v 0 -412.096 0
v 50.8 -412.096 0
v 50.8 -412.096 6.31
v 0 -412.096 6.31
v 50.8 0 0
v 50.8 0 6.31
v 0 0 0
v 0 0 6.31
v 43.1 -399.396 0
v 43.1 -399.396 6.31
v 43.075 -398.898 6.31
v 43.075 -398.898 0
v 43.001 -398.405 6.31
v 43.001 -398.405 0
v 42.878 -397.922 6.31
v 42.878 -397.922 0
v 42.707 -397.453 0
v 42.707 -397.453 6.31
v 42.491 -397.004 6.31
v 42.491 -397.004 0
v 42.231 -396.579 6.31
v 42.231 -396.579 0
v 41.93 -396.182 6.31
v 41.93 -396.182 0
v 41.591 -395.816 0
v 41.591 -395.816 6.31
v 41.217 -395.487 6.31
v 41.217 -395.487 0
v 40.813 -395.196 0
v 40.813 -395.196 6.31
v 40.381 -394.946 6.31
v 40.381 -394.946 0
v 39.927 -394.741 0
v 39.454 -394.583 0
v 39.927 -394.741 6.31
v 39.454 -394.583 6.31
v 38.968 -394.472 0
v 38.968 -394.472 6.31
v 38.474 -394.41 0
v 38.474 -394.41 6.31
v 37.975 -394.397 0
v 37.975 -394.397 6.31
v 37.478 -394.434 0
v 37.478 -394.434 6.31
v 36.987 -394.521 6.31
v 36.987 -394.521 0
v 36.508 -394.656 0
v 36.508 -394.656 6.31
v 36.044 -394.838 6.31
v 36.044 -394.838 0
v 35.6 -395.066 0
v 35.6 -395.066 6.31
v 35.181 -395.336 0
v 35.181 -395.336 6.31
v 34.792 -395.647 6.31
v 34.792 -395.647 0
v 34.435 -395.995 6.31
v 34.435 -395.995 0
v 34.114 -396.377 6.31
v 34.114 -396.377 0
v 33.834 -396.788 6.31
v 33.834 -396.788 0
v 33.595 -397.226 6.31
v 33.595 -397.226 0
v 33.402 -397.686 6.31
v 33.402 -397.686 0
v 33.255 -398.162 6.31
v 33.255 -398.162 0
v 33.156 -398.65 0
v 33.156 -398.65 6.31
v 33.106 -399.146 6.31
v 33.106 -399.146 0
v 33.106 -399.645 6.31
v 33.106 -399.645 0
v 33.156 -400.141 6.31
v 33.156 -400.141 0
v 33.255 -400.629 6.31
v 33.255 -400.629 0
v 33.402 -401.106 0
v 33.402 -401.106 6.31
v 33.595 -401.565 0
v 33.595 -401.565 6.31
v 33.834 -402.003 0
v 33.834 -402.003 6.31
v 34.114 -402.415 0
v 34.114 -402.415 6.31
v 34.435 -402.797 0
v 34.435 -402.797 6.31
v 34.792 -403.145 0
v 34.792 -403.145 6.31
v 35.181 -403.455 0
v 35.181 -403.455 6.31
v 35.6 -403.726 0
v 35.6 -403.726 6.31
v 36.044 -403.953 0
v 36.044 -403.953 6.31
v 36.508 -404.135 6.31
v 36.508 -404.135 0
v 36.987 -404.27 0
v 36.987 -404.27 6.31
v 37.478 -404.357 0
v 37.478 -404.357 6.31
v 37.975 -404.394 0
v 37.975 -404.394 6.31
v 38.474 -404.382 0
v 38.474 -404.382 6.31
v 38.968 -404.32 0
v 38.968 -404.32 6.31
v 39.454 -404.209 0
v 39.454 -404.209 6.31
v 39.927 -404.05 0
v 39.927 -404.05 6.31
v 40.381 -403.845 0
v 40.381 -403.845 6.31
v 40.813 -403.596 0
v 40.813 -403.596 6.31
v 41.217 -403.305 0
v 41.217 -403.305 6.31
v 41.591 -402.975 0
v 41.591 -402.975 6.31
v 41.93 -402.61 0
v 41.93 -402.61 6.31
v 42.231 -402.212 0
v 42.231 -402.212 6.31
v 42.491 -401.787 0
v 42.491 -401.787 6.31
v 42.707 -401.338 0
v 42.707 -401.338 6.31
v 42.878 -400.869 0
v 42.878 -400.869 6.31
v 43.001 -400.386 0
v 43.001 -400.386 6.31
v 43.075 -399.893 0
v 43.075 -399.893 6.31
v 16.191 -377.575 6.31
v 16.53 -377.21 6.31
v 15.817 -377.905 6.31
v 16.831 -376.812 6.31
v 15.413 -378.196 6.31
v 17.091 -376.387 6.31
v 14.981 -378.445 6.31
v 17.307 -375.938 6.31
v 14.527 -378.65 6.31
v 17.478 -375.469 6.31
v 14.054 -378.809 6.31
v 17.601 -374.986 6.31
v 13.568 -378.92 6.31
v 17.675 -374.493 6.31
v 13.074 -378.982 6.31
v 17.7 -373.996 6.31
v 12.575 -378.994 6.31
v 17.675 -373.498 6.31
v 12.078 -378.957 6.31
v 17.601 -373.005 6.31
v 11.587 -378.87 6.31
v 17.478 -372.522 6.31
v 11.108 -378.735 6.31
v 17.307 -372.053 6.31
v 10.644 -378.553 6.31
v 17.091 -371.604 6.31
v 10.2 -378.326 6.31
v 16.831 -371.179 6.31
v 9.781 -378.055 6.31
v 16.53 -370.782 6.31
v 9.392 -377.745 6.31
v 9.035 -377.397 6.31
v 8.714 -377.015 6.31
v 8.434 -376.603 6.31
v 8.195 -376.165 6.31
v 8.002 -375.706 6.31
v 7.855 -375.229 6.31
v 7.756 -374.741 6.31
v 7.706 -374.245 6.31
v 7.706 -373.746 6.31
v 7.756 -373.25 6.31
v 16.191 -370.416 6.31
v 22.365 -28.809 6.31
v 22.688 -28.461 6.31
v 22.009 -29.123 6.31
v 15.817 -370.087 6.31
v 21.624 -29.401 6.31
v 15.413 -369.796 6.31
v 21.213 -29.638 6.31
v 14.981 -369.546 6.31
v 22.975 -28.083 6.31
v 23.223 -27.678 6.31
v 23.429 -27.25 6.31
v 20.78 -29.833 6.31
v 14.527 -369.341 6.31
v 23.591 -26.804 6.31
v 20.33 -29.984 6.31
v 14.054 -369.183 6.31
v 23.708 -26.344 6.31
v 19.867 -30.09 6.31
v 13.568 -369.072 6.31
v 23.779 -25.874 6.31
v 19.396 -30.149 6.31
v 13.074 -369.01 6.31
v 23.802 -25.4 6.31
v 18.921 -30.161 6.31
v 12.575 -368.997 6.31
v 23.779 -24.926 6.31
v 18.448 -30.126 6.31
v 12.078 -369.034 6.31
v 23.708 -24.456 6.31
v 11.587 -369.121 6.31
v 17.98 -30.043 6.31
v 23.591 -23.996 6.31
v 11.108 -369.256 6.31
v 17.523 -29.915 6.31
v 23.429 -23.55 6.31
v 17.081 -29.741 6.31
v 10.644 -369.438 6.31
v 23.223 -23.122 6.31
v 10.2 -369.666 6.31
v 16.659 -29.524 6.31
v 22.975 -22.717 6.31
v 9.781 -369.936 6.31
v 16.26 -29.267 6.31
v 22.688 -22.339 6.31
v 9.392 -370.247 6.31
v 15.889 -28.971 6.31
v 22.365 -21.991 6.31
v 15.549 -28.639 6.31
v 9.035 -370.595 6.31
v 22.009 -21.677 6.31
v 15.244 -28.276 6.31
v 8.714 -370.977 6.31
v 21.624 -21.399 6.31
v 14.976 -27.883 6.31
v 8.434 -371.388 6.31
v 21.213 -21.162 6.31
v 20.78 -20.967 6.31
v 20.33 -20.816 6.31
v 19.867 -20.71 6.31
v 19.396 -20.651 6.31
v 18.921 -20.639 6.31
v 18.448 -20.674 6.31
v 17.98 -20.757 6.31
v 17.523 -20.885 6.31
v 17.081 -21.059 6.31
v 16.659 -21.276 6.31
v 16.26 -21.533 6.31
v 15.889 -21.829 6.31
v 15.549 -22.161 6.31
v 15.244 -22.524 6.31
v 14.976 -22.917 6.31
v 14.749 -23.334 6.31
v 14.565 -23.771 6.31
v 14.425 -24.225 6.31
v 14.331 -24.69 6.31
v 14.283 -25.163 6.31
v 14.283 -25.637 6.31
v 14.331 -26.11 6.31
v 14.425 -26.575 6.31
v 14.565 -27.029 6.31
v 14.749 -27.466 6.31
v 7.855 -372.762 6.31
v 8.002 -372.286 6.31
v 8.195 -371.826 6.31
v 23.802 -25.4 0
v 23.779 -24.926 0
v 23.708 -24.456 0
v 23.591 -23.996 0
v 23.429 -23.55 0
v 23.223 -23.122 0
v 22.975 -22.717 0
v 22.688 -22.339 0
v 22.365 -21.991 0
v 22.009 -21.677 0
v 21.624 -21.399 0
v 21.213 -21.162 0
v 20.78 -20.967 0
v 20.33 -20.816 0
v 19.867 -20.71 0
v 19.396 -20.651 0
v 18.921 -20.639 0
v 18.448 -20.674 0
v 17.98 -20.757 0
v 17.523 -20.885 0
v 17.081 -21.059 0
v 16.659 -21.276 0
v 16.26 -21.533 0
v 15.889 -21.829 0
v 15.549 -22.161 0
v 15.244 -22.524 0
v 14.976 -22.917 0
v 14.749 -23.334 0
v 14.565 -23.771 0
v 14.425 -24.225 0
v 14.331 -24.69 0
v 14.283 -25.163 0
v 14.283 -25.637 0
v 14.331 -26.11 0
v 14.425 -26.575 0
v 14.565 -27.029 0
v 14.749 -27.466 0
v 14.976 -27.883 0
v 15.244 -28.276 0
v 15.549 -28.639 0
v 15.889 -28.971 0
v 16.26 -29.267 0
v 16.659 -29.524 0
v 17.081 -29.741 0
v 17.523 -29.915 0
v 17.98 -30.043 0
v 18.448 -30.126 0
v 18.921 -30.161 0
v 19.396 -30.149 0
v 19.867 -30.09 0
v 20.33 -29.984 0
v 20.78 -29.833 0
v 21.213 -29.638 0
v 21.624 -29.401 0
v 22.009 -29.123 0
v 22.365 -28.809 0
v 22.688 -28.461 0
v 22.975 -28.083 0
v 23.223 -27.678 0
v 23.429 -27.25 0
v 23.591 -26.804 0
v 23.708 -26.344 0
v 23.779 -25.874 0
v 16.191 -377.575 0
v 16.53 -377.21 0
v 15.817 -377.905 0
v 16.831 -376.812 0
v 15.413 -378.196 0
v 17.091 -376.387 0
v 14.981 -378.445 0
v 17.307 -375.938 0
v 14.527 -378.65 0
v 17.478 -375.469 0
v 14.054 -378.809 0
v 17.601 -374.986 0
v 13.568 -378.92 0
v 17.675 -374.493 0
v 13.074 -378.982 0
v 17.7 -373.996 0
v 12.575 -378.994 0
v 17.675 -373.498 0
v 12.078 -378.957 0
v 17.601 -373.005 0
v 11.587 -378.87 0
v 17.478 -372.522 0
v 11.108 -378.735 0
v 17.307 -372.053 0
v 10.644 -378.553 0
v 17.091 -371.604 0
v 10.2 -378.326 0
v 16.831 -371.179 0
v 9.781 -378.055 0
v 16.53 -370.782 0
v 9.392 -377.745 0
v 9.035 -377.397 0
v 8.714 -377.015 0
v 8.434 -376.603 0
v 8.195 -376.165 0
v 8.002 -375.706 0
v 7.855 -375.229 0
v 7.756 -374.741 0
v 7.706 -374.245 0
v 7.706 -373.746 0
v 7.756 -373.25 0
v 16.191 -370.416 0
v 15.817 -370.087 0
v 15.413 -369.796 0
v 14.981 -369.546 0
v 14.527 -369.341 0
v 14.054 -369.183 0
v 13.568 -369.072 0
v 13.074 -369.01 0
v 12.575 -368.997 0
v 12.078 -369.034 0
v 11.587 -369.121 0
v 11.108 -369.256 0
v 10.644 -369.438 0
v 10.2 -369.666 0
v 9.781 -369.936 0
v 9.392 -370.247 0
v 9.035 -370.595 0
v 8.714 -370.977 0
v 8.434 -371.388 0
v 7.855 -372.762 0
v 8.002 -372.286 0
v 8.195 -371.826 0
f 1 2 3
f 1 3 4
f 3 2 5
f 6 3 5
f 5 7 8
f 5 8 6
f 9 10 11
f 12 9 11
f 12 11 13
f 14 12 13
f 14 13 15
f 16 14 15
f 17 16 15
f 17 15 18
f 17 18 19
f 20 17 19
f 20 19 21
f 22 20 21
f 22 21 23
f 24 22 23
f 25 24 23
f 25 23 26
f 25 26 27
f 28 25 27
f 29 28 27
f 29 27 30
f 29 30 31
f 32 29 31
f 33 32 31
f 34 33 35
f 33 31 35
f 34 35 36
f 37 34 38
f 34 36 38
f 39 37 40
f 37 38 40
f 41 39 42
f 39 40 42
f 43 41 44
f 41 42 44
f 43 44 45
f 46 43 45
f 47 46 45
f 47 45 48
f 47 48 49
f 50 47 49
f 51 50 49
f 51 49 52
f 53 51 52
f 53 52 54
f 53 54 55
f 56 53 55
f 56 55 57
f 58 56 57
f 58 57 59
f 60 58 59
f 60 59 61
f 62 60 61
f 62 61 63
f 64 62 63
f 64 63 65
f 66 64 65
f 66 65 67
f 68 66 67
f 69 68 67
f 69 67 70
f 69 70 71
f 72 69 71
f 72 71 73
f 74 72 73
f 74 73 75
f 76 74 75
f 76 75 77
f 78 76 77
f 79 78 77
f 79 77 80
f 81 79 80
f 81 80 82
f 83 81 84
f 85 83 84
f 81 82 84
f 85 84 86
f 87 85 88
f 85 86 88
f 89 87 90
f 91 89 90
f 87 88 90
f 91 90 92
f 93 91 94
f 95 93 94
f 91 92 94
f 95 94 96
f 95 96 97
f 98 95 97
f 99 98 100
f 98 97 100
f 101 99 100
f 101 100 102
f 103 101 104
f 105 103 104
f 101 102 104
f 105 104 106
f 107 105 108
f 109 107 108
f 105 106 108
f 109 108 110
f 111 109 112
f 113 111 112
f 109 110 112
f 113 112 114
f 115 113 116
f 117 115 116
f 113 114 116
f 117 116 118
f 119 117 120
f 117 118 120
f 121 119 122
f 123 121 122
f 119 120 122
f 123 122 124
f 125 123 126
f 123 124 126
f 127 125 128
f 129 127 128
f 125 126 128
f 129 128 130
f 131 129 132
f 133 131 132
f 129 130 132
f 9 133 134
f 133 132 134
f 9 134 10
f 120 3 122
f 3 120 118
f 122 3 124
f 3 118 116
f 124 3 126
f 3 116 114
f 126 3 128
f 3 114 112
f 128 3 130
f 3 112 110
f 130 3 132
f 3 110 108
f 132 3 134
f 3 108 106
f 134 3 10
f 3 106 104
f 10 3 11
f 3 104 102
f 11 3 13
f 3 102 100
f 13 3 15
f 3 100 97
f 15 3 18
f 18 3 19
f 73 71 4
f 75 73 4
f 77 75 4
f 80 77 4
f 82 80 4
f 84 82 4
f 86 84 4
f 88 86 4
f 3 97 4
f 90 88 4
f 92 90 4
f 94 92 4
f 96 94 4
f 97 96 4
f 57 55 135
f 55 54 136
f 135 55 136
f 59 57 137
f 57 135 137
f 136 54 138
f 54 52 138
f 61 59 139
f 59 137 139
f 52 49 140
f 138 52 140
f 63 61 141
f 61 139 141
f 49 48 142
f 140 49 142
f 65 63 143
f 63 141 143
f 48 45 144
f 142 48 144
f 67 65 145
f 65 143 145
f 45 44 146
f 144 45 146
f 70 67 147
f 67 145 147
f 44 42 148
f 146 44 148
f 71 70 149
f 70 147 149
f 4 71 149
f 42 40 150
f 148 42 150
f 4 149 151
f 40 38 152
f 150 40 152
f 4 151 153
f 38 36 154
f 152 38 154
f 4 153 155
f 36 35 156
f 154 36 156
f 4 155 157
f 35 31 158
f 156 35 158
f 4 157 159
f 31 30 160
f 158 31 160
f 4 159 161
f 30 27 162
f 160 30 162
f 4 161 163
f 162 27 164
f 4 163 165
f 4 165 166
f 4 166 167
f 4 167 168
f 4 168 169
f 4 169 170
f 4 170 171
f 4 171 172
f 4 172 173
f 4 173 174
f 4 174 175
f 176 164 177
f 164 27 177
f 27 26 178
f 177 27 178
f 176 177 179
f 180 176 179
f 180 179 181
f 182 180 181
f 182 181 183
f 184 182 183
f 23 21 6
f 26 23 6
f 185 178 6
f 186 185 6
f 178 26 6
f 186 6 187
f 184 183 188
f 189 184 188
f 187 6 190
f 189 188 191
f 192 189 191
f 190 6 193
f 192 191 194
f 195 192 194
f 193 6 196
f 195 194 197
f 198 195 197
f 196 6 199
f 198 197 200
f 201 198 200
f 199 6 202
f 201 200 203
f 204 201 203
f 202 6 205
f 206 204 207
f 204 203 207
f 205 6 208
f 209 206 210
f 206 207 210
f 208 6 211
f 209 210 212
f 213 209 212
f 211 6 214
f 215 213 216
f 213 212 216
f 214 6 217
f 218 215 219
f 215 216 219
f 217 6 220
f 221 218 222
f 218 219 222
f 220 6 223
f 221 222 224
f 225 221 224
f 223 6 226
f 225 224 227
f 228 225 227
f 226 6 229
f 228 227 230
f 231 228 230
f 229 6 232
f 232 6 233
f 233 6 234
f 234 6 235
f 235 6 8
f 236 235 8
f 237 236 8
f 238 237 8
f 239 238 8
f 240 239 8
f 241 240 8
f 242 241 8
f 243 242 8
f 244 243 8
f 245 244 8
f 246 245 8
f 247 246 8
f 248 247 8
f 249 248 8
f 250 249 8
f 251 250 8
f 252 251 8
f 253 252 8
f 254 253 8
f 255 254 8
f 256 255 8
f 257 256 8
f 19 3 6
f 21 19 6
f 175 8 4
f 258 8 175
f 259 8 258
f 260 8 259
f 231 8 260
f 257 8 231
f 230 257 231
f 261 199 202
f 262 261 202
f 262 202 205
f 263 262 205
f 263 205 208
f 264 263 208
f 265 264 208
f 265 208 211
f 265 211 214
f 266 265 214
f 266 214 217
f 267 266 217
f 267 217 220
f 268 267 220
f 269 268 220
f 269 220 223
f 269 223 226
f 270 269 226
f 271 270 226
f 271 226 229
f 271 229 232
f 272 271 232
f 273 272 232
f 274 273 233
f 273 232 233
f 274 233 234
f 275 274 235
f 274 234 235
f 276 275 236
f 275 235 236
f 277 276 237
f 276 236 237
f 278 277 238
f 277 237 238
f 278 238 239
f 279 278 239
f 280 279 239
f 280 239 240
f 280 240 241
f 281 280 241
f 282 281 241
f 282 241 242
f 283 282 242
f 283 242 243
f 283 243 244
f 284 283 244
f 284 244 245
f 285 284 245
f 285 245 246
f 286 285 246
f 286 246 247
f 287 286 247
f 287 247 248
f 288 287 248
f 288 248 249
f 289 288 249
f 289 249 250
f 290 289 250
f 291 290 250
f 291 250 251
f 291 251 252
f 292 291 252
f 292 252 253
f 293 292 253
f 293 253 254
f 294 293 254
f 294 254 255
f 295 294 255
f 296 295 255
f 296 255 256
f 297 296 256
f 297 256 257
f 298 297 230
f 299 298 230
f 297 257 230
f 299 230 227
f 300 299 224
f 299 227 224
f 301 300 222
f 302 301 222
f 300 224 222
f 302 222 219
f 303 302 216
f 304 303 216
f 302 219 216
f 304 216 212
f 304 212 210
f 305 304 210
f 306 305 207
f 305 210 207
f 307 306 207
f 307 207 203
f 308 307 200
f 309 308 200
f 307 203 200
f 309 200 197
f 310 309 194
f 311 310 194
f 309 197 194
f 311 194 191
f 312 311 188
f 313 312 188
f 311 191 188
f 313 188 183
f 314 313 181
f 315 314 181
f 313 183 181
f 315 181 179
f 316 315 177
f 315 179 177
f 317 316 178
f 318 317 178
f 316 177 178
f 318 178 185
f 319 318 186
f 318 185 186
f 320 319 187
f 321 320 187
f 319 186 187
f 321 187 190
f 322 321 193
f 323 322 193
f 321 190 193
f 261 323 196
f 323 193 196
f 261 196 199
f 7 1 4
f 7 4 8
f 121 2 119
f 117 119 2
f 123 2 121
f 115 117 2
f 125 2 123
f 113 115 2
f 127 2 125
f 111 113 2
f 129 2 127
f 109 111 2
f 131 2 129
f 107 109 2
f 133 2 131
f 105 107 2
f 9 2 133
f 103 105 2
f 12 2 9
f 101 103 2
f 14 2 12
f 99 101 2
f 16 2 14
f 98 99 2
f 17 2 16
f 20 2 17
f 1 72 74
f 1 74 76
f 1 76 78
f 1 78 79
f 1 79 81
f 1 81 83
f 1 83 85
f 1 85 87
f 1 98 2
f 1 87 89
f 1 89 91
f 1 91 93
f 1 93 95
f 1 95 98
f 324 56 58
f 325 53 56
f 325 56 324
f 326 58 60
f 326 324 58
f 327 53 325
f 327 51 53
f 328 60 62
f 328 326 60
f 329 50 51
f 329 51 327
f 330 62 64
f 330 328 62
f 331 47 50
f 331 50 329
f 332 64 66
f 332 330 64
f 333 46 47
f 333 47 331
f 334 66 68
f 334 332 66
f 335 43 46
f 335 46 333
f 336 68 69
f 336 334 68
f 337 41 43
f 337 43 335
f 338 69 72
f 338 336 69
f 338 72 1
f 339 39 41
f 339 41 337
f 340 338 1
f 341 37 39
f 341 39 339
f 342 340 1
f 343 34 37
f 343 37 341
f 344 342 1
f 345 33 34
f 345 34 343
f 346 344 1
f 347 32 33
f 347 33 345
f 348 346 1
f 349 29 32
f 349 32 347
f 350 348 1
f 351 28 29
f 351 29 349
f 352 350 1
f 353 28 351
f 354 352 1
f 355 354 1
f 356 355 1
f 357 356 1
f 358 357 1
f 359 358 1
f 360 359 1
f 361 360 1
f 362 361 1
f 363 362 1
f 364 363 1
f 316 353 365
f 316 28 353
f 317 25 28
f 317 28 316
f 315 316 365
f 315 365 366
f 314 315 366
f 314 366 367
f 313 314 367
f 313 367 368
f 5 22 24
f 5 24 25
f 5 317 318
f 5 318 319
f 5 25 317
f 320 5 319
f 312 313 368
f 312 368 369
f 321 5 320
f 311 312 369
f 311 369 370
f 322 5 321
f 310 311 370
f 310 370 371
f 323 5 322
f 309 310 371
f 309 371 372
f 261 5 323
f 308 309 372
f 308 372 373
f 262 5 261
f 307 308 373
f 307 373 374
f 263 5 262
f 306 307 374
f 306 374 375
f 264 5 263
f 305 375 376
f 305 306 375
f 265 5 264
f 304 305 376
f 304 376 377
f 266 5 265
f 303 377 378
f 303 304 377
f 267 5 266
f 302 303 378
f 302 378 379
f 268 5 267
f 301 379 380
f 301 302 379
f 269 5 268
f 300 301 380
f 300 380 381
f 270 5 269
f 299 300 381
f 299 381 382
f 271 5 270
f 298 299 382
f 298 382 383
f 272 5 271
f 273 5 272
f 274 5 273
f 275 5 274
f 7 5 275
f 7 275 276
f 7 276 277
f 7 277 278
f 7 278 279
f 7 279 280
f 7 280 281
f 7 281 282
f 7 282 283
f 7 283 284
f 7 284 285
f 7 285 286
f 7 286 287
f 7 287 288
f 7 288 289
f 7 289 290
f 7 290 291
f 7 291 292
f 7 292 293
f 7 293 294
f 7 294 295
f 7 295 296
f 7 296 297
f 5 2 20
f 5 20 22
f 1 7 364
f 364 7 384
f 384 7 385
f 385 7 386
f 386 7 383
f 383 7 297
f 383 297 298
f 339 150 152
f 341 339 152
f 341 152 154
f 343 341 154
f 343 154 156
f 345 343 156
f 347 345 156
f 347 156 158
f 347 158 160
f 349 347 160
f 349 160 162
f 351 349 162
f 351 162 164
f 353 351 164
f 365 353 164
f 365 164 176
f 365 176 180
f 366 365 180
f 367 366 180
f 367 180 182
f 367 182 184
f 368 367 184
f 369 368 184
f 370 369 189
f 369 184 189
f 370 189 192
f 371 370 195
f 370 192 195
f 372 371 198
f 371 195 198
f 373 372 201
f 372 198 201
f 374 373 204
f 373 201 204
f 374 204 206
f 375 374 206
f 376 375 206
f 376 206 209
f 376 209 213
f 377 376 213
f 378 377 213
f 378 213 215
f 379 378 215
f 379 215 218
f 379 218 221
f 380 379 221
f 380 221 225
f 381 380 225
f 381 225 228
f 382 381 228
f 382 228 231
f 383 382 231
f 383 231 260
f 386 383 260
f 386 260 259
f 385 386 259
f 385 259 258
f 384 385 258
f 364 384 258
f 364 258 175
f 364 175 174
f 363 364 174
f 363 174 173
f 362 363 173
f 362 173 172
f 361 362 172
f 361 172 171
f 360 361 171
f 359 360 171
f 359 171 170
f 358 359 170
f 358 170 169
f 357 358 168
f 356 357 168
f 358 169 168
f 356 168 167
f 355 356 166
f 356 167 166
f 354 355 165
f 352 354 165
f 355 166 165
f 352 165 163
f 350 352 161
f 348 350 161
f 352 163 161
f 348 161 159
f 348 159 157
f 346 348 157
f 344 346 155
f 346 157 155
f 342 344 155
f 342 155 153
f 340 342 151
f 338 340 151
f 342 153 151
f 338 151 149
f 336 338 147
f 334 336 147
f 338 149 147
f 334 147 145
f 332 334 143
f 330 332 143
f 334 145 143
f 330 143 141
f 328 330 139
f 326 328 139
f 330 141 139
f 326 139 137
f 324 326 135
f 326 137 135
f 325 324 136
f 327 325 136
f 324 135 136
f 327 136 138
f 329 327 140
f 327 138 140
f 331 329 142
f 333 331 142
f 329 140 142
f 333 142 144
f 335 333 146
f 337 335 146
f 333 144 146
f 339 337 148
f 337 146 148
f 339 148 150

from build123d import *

# Parameters (mm, degrees)
SALIENTE_EXTRUIR1_DEPTH = 6.31
CROQUIS3_R              = 4.7625
CORTAR_EXTRUIR1_DEPTH   = 9.525
CROQUIS4_R              = 5
CORTAR_EXTRUIR2_DEPTH   = 9.525


with BuildPart() as part:
    # Croquis2 → Saliente-Extruir1 (new body)
    with BuildSketch(Plane.XY):
        Polygon((0, 0), (50.8, 0), (50.8, -361.29566061), (50.8, -412.09566061), (0, -412.09566061), align=None)
    extrude(amount=SALIENTE_EXTRUIR1_DEPTH)

    # Croquis3 → Cortar-Extruir1 (cut)
    with BuildSketch(Plane.XY.offset(6.31)):
        with Locations((19.04, -25.4)):
            Circle(CROQUIS3_R)
    extrude(amount=-CORTAR_EXTRUIR1_DEPTH, mode=Mode.SUBTRACT)

    # Croquis4 → Cortar-Extruir2 (cut)
    with BuildSketch(Plane.XY.offset(6.31)):
        with Locations((12.7, -373.995660606)):
            Circle(CROQUIS4_R)
        with Locations((38.1, -399.395660606)):
            Circle(CROQUIS4_R)
    extrude(amount=-CORTAR_EXTRUIR2_DEPTH, mode=Mode.SUBTRACT)


solid = part.part
